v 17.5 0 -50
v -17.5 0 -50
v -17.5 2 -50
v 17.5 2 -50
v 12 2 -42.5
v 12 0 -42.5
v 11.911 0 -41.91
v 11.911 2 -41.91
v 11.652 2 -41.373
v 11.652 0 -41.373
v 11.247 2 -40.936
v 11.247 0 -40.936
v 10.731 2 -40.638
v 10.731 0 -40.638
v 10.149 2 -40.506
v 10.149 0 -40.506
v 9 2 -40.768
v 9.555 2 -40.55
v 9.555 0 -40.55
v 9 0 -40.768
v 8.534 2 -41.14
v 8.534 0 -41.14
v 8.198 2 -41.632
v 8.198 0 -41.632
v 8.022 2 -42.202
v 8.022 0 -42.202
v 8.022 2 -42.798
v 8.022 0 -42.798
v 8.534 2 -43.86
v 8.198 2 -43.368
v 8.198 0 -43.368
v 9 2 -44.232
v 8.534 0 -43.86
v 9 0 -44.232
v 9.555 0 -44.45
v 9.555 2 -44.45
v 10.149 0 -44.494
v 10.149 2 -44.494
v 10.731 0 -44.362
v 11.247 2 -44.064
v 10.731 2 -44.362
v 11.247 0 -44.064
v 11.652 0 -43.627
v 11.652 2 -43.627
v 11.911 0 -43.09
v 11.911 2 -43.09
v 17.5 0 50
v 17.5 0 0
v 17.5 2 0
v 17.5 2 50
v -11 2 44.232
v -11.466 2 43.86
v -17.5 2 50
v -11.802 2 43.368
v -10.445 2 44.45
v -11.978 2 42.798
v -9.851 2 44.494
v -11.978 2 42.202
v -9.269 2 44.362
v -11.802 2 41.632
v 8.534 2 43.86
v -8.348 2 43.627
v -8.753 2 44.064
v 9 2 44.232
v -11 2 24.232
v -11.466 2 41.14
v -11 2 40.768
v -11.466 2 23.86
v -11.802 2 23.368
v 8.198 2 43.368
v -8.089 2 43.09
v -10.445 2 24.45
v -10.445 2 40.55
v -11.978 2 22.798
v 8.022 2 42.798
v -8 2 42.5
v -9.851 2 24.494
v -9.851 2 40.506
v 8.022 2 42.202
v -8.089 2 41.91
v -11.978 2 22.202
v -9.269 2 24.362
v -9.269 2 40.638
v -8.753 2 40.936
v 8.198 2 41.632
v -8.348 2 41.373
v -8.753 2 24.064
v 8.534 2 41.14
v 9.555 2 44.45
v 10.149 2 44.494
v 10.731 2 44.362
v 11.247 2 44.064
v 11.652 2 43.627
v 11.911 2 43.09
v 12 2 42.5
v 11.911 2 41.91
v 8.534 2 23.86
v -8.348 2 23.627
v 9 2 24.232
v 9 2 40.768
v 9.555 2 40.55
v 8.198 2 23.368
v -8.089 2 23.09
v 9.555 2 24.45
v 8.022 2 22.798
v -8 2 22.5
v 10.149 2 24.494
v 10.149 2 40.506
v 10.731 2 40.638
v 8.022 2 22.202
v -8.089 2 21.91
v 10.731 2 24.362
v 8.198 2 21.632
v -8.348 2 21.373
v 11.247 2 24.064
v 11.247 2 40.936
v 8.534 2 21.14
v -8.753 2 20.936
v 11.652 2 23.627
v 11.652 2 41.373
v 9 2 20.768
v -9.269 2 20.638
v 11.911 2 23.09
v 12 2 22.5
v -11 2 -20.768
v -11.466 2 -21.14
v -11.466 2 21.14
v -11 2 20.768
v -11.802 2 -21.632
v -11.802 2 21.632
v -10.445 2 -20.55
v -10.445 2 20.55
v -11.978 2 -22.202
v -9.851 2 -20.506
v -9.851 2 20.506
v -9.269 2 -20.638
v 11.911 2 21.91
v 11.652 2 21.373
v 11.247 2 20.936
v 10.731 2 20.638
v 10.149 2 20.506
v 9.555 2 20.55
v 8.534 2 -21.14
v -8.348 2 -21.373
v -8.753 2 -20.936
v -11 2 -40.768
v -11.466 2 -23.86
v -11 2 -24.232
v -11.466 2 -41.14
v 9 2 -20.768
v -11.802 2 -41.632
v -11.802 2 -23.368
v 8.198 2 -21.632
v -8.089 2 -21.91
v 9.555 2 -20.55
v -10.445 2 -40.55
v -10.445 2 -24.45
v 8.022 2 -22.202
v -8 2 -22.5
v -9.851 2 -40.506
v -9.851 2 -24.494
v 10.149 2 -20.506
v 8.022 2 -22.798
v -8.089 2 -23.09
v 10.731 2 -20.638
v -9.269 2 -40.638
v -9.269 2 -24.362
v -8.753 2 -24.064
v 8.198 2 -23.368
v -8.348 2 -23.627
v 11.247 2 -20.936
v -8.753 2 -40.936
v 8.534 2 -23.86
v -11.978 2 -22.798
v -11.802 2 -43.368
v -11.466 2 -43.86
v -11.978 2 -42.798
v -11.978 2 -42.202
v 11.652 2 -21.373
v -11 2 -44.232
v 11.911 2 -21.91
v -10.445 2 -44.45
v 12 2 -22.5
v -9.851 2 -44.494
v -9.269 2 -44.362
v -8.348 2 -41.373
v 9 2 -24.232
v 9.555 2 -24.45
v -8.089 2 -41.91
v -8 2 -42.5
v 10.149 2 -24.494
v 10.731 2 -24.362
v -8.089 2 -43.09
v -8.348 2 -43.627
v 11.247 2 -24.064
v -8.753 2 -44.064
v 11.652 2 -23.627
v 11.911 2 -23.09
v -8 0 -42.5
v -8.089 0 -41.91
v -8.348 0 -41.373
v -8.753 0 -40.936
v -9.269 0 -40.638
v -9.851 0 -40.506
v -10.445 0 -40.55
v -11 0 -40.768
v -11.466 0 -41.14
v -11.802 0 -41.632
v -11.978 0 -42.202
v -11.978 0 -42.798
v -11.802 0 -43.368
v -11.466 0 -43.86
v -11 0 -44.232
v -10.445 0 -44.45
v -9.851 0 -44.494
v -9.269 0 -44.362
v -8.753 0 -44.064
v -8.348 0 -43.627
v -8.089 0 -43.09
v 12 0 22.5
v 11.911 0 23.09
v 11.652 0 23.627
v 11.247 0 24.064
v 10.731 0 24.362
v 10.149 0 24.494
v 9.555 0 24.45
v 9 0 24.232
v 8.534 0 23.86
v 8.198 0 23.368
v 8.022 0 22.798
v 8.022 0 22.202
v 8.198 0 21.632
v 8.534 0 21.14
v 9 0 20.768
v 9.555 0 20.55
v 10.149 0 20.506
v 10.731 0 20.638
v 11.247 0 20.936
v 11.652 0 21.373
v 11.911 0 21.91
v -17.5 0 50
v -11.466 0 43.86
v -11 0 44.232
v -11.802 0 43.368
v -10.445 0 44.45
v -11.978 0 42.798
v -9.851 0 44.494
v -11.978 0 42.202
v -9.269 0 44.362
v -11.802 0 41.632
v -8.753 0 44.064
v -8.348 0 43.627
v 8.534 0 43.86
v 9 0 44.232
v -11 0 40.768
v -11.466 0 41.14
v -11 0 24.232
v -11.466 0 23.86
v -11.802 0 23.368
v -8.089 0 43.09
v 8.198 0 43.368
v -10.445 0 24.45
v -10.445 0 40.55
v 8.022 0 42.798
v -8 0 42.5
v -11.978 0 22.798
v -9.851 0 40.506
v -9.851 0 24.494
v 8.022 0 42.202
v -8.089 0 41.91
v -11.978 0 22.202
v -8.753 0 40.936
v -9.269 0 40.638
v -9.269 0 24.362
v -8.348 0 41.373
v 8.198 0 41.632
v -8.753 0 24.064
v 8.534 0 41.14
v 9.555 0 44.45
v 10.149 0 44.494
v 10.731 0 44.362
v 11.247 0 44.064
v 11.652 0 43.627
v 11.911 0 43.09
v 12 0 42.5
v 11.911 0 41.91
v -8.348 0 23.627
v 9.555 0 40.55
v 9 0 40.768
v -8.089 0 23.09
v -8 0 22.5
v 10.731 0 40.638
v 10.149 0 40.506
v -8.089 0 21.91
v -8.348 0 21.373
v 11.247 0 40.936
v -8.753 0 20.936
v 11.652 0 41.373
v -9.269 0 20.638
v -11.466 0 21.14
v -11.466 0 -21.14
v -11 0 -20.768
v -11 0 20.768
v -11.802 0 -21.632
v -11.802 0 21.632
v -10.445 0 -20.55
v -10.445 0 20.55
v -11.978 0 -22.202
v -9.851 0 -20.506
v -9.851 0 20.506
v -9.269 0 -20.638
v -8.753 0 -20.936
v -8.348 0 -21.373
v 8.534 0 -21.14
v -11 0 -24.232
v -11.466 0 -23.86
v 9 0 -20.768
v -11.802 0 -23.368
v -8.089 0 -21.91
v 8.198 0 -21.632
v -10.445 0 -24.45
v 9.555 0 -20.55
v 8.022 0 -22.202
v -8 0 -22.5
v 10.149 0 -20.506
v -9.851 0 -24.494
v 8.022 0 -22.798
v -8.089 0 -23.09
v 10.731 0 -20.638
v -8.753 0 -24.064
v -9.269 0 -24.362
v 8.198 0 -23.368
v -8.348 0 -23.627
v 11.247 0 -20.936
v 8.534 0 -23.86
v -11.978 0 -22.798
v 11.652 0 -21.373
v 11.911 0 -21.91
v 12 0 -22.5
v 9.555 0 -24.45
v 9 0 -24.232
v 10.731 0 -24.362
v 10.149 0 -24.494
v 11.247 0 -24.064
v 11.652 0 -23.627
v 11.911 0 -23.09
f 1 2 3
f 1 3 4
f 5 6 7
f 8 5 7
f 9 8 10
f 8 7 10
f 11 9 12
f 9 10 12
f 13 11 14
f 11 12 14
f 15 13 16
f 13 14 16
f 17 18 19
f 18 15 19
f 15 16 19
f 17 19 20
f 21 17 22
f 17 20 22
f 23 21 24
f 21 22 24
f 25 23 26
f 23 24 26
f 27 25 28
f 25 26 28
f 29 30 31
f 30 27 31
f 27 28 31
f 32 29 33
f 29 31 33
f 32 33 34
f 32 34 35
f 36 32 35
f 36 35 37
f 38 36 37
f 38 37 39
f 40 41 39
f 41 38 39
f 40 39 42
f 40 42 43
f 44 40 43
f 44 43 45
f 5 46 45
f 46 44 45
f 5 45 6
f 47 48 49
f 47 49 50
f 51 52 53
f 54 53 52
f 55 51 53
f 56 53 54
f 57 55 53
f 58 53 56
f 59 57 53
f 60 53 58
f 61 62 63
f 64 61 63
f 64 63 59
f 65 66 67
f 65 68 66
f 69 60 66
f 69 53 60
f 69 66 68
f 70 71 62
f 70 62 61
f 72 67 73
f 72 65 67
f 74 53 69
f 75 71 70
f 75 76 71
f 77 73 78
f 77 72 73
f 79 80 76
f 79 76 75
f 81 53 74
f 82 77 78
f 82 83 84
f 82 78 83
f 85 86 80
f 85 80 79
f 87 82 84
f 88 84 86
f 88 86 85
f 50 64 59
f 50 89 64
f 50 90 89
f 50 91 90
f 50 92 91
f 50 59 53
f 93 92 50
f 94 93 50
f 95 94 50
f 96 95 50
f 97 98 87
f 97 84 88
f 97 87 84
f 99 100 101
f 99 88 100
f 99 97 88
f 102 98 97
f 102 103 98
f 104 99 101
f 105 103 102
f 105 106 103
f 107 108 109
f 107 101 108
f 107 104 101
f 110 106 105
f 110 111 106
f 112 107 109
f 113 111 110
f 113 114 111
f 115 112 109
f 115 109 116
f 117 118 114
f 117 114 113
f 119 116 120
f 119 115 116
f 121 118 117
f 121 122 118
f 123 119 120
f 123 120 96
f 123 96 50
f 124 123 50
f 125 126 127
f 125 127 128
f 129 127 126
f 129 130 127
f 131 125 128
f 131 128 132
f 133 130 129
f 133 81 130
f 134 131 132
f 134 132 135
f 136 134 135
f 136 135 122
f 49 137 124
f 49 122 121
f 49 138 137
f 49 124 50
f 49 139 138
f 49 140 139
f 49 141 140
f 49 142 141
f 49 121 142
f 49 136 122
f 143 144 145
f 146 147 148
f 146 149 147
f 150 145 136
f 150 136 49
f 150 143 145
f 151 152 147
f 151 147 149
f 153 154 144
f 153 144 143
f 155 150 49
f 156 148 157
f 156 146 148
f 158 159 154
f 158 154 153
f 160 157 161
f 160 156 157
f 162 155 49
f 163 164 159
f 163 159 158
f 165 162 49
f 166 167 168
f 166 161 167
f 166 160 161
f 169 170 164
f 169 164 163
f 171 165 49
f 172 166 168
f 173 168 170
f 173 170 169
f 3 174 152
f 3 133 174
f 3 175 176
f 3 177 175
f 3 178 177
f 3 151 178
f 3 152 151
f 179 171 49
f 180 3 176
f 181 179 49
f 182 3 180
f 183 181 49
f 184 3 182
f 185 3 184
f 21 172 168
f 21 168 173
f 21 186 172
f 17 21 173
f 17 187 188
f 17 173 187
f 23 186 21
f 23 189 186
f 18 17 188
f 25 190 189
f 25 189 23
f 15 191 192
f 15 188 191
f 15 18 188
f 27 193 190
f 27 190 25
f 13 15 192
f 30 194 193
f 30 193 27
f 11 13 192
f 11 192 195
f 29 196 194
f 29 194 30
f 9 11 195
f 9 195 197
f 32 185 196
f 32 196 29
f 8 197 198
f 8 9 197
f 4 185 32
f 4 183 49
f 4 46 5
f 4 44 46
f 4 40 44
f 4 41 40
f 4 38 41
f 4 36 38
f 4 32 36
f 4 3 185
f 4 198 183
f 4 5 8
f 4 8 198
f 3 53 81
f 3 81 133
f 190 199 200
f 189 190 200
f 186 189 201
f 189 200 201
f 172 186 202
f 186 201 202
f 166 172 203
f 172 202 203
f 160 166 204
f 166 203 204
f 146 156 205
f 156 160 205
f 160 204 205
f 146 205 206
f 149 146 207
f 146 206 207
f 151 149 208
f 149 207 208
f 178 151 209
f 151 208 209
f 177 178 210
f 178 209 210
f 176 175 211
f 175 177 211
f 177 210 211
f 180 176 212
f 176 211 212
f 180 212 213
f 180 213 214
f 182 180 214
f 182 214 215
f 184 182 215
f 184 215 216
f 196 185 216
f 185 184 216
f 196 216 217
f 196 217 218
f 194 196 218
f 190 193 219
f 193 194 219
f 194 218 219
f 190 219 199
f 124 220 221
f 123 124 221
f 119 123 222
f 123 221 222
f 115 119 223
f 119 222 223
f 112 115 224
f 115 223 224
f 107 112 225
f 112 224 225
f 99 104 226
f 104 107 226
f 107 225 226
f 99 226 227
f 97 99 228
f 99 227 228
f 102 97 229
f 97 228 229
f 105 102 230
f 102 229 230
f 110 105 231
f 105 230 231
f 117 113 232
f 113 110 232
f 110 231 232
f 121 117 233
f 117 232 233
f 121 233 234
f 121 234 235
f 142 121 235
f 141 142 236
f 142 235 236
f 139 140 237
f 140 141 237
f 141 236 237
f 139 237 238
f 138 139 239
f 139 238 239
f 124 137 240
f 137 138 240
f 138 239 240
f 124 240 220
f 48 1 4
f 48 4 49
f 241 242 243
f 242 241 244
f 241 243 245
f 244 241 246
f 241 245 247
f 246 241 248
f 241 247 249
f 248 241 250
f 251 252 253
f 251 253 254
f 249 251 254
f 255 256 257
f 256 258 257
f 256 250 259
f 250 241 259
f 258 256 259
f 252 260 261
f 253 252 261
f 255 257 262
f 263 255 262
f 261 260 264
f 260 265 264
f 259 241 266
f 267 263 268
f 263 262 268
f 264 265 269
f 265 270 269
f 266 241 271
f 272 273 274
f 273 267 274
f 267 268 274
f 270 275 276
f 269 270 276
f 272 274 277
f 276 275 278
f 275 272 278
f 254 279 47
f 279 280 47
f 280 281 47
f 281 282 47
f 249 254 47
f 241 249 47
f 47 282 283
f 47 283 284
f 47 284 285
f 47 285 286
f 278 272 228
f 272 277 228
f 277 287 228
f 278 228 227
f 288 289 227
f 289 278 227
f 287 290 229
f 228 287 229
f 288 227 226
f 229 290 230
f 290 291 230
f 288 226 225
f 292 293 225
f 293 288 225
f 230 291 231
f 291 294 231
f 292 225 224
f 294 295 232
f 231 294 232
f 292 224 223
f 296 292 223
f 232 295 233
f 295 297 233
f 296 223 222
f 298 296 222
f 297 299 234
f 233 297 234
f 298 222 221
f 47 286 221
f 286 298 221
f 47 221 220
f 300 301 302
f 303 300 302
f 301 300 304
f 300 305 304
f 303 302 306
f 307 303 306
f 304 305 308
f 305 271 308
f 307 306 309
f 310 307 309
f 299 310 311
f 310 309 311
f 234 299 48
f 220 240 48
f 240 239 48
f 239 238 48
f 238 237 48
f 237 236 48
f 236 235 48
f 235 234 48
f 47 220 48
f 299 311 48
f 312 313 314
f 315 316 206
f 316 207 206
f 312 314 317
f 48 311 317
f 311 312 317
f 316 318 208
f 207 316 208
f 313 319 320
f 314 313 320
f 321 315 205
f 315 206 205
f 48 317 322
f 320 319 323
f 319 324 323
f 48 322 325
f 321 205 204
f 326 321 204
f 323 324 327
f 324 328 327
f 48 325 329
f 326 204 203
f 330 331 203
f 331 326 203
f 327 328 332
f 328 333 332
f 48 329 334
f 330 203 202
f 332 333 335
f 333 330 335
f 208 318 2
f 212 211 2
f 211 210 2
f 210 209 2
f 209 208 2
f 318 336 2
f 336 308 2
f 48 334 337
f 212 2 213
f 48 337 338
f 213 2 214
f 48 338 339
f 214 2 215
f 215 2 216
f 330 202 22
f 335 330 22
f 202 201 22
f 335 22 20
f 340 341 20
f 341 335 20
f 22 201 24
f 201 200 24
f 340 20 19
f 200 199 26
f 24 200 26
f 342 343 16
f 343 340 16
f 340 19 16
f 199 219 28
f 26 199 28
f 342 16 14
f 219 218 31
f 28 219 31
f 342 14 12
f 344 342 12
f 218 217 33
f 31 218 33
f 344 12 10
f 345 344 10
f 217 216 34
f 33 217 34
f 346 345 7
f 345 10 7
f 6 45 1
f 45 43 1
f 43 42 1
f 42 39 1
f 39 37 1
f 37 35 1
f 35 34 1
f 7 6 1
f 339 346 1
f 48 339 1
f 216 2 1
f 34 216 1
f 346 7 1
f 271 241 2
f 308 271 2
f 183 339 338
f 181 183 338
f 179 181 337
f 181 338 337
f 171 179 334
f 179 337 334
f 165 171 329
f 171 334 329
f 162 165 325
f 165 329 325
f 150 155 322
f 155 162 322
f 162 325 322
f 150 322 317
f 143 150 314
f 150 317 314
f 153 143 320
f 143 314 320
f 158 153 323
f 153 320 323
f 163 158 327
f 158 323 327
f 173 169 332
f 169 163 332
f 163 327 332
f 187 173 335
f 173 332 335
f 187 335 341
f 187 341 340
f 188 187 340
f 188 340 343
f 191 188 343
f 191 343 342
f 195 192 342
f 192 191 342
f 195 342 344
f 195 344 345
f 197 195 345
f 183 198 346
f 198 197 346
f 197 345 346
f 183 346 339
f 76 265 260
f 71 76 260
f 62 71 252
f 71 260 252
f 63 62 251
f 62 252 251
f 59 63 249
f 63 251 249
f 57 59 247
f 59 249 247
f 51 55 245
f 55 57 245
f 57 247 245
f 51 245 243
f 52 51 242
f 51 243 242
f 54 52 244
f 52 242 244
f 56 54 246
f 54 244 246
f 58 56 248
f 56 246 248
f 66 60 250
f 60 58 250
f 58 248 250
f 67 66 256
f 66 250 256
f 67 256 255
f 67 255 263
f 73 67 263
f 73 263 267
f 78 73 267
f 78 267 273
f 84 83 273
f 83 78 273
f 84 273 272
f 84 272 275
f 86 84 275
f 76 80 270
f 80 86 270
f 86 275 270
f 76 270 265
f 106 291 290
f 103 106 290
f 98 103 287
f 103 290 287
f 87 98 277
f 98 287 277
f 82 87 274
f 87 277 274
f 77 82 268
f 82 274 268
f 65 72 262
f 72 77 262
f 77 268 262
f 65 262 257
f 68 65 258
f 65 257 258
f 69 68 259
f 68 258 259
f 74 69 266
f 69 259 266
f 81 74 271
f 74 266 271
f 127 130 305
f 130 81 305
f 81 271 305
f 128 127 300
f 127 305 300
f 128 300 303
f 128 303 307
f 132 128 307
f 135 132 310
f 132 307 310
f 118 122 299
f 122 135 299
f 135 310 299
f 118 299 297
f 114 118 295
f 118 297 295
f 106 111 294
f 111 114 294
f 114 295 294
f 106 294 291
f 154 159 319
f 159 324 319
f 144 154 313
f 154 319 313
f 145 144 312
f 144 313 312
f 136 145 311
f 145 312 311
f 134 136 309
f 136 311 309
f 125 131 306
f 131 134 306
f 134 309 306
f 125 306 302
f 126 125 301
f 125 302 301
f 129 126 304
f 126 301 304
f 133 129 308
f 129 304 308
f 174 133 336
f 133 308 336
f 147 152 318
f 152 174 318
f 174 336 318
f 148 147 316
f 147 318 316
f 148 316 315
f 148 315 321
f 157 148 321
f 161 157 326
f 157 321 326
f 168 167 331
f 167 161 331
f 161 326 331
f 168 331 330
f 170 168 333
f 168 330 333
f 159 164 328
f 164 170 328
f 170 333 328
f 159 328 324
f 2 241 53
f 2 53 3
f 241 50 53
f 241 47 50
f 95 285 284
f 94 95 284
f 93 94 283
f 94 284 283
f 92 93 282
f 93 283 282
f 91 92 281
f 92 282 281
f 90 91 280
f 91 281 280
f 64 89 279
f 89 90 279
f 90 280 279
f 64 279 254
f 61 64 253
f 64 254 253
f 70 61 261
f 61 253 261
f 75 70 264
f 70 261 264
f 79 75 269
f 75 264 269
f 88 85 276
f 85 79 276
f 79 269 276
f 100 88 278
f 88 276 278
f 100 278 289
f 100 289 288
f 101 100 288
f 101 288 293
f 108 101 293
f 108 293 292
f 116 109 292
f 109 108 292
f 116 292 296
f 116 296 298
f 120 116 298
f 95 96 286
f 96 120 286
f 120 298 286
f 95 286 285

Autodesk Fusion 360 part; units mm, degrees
sketch "Sketch1" plane through (0, 0, 0) normal (0, 1, 0) x (1, 0, 0)
  line L0 (-17.5, 50) -> (17.5, 50)
  line L1 (17.5, 50) -> (17.5, -50)
  line L2 (17.5, -50) -> (-17.5, -50)
  line L3 (-17.5, -50) -> (-17.5, 50)
  circle A0 centre (-10, 42.5) radius 2
  circle A1 centre (10, 42.5) radius 2
  circle A2 centre (-10, 22.5) radius 2
  circle A3 centre (10, 22.5) radius 2
  line L4 (1.75, 0) -> (22.5, 0)
  circle A4 centre (-10, -42.5) radius 2
  circle A5 centre (10, -42.5) radius 2
  circle A6 centre (10, -22.5) radius 2
  circle A7 centre (-10, -22.5) radius 2
  dimension "d1" = 35
  dimension "d2" = 100
  dimension "d3" = 4
  dimension "d6" = 20
  dimension "d7" = -20
  dimension "d8" = 7.5
  dimension "d9" = 7.5
extrude "Extrude1" add sketch "Sketch1" along normal blind 2
equation "d9 = d8"
